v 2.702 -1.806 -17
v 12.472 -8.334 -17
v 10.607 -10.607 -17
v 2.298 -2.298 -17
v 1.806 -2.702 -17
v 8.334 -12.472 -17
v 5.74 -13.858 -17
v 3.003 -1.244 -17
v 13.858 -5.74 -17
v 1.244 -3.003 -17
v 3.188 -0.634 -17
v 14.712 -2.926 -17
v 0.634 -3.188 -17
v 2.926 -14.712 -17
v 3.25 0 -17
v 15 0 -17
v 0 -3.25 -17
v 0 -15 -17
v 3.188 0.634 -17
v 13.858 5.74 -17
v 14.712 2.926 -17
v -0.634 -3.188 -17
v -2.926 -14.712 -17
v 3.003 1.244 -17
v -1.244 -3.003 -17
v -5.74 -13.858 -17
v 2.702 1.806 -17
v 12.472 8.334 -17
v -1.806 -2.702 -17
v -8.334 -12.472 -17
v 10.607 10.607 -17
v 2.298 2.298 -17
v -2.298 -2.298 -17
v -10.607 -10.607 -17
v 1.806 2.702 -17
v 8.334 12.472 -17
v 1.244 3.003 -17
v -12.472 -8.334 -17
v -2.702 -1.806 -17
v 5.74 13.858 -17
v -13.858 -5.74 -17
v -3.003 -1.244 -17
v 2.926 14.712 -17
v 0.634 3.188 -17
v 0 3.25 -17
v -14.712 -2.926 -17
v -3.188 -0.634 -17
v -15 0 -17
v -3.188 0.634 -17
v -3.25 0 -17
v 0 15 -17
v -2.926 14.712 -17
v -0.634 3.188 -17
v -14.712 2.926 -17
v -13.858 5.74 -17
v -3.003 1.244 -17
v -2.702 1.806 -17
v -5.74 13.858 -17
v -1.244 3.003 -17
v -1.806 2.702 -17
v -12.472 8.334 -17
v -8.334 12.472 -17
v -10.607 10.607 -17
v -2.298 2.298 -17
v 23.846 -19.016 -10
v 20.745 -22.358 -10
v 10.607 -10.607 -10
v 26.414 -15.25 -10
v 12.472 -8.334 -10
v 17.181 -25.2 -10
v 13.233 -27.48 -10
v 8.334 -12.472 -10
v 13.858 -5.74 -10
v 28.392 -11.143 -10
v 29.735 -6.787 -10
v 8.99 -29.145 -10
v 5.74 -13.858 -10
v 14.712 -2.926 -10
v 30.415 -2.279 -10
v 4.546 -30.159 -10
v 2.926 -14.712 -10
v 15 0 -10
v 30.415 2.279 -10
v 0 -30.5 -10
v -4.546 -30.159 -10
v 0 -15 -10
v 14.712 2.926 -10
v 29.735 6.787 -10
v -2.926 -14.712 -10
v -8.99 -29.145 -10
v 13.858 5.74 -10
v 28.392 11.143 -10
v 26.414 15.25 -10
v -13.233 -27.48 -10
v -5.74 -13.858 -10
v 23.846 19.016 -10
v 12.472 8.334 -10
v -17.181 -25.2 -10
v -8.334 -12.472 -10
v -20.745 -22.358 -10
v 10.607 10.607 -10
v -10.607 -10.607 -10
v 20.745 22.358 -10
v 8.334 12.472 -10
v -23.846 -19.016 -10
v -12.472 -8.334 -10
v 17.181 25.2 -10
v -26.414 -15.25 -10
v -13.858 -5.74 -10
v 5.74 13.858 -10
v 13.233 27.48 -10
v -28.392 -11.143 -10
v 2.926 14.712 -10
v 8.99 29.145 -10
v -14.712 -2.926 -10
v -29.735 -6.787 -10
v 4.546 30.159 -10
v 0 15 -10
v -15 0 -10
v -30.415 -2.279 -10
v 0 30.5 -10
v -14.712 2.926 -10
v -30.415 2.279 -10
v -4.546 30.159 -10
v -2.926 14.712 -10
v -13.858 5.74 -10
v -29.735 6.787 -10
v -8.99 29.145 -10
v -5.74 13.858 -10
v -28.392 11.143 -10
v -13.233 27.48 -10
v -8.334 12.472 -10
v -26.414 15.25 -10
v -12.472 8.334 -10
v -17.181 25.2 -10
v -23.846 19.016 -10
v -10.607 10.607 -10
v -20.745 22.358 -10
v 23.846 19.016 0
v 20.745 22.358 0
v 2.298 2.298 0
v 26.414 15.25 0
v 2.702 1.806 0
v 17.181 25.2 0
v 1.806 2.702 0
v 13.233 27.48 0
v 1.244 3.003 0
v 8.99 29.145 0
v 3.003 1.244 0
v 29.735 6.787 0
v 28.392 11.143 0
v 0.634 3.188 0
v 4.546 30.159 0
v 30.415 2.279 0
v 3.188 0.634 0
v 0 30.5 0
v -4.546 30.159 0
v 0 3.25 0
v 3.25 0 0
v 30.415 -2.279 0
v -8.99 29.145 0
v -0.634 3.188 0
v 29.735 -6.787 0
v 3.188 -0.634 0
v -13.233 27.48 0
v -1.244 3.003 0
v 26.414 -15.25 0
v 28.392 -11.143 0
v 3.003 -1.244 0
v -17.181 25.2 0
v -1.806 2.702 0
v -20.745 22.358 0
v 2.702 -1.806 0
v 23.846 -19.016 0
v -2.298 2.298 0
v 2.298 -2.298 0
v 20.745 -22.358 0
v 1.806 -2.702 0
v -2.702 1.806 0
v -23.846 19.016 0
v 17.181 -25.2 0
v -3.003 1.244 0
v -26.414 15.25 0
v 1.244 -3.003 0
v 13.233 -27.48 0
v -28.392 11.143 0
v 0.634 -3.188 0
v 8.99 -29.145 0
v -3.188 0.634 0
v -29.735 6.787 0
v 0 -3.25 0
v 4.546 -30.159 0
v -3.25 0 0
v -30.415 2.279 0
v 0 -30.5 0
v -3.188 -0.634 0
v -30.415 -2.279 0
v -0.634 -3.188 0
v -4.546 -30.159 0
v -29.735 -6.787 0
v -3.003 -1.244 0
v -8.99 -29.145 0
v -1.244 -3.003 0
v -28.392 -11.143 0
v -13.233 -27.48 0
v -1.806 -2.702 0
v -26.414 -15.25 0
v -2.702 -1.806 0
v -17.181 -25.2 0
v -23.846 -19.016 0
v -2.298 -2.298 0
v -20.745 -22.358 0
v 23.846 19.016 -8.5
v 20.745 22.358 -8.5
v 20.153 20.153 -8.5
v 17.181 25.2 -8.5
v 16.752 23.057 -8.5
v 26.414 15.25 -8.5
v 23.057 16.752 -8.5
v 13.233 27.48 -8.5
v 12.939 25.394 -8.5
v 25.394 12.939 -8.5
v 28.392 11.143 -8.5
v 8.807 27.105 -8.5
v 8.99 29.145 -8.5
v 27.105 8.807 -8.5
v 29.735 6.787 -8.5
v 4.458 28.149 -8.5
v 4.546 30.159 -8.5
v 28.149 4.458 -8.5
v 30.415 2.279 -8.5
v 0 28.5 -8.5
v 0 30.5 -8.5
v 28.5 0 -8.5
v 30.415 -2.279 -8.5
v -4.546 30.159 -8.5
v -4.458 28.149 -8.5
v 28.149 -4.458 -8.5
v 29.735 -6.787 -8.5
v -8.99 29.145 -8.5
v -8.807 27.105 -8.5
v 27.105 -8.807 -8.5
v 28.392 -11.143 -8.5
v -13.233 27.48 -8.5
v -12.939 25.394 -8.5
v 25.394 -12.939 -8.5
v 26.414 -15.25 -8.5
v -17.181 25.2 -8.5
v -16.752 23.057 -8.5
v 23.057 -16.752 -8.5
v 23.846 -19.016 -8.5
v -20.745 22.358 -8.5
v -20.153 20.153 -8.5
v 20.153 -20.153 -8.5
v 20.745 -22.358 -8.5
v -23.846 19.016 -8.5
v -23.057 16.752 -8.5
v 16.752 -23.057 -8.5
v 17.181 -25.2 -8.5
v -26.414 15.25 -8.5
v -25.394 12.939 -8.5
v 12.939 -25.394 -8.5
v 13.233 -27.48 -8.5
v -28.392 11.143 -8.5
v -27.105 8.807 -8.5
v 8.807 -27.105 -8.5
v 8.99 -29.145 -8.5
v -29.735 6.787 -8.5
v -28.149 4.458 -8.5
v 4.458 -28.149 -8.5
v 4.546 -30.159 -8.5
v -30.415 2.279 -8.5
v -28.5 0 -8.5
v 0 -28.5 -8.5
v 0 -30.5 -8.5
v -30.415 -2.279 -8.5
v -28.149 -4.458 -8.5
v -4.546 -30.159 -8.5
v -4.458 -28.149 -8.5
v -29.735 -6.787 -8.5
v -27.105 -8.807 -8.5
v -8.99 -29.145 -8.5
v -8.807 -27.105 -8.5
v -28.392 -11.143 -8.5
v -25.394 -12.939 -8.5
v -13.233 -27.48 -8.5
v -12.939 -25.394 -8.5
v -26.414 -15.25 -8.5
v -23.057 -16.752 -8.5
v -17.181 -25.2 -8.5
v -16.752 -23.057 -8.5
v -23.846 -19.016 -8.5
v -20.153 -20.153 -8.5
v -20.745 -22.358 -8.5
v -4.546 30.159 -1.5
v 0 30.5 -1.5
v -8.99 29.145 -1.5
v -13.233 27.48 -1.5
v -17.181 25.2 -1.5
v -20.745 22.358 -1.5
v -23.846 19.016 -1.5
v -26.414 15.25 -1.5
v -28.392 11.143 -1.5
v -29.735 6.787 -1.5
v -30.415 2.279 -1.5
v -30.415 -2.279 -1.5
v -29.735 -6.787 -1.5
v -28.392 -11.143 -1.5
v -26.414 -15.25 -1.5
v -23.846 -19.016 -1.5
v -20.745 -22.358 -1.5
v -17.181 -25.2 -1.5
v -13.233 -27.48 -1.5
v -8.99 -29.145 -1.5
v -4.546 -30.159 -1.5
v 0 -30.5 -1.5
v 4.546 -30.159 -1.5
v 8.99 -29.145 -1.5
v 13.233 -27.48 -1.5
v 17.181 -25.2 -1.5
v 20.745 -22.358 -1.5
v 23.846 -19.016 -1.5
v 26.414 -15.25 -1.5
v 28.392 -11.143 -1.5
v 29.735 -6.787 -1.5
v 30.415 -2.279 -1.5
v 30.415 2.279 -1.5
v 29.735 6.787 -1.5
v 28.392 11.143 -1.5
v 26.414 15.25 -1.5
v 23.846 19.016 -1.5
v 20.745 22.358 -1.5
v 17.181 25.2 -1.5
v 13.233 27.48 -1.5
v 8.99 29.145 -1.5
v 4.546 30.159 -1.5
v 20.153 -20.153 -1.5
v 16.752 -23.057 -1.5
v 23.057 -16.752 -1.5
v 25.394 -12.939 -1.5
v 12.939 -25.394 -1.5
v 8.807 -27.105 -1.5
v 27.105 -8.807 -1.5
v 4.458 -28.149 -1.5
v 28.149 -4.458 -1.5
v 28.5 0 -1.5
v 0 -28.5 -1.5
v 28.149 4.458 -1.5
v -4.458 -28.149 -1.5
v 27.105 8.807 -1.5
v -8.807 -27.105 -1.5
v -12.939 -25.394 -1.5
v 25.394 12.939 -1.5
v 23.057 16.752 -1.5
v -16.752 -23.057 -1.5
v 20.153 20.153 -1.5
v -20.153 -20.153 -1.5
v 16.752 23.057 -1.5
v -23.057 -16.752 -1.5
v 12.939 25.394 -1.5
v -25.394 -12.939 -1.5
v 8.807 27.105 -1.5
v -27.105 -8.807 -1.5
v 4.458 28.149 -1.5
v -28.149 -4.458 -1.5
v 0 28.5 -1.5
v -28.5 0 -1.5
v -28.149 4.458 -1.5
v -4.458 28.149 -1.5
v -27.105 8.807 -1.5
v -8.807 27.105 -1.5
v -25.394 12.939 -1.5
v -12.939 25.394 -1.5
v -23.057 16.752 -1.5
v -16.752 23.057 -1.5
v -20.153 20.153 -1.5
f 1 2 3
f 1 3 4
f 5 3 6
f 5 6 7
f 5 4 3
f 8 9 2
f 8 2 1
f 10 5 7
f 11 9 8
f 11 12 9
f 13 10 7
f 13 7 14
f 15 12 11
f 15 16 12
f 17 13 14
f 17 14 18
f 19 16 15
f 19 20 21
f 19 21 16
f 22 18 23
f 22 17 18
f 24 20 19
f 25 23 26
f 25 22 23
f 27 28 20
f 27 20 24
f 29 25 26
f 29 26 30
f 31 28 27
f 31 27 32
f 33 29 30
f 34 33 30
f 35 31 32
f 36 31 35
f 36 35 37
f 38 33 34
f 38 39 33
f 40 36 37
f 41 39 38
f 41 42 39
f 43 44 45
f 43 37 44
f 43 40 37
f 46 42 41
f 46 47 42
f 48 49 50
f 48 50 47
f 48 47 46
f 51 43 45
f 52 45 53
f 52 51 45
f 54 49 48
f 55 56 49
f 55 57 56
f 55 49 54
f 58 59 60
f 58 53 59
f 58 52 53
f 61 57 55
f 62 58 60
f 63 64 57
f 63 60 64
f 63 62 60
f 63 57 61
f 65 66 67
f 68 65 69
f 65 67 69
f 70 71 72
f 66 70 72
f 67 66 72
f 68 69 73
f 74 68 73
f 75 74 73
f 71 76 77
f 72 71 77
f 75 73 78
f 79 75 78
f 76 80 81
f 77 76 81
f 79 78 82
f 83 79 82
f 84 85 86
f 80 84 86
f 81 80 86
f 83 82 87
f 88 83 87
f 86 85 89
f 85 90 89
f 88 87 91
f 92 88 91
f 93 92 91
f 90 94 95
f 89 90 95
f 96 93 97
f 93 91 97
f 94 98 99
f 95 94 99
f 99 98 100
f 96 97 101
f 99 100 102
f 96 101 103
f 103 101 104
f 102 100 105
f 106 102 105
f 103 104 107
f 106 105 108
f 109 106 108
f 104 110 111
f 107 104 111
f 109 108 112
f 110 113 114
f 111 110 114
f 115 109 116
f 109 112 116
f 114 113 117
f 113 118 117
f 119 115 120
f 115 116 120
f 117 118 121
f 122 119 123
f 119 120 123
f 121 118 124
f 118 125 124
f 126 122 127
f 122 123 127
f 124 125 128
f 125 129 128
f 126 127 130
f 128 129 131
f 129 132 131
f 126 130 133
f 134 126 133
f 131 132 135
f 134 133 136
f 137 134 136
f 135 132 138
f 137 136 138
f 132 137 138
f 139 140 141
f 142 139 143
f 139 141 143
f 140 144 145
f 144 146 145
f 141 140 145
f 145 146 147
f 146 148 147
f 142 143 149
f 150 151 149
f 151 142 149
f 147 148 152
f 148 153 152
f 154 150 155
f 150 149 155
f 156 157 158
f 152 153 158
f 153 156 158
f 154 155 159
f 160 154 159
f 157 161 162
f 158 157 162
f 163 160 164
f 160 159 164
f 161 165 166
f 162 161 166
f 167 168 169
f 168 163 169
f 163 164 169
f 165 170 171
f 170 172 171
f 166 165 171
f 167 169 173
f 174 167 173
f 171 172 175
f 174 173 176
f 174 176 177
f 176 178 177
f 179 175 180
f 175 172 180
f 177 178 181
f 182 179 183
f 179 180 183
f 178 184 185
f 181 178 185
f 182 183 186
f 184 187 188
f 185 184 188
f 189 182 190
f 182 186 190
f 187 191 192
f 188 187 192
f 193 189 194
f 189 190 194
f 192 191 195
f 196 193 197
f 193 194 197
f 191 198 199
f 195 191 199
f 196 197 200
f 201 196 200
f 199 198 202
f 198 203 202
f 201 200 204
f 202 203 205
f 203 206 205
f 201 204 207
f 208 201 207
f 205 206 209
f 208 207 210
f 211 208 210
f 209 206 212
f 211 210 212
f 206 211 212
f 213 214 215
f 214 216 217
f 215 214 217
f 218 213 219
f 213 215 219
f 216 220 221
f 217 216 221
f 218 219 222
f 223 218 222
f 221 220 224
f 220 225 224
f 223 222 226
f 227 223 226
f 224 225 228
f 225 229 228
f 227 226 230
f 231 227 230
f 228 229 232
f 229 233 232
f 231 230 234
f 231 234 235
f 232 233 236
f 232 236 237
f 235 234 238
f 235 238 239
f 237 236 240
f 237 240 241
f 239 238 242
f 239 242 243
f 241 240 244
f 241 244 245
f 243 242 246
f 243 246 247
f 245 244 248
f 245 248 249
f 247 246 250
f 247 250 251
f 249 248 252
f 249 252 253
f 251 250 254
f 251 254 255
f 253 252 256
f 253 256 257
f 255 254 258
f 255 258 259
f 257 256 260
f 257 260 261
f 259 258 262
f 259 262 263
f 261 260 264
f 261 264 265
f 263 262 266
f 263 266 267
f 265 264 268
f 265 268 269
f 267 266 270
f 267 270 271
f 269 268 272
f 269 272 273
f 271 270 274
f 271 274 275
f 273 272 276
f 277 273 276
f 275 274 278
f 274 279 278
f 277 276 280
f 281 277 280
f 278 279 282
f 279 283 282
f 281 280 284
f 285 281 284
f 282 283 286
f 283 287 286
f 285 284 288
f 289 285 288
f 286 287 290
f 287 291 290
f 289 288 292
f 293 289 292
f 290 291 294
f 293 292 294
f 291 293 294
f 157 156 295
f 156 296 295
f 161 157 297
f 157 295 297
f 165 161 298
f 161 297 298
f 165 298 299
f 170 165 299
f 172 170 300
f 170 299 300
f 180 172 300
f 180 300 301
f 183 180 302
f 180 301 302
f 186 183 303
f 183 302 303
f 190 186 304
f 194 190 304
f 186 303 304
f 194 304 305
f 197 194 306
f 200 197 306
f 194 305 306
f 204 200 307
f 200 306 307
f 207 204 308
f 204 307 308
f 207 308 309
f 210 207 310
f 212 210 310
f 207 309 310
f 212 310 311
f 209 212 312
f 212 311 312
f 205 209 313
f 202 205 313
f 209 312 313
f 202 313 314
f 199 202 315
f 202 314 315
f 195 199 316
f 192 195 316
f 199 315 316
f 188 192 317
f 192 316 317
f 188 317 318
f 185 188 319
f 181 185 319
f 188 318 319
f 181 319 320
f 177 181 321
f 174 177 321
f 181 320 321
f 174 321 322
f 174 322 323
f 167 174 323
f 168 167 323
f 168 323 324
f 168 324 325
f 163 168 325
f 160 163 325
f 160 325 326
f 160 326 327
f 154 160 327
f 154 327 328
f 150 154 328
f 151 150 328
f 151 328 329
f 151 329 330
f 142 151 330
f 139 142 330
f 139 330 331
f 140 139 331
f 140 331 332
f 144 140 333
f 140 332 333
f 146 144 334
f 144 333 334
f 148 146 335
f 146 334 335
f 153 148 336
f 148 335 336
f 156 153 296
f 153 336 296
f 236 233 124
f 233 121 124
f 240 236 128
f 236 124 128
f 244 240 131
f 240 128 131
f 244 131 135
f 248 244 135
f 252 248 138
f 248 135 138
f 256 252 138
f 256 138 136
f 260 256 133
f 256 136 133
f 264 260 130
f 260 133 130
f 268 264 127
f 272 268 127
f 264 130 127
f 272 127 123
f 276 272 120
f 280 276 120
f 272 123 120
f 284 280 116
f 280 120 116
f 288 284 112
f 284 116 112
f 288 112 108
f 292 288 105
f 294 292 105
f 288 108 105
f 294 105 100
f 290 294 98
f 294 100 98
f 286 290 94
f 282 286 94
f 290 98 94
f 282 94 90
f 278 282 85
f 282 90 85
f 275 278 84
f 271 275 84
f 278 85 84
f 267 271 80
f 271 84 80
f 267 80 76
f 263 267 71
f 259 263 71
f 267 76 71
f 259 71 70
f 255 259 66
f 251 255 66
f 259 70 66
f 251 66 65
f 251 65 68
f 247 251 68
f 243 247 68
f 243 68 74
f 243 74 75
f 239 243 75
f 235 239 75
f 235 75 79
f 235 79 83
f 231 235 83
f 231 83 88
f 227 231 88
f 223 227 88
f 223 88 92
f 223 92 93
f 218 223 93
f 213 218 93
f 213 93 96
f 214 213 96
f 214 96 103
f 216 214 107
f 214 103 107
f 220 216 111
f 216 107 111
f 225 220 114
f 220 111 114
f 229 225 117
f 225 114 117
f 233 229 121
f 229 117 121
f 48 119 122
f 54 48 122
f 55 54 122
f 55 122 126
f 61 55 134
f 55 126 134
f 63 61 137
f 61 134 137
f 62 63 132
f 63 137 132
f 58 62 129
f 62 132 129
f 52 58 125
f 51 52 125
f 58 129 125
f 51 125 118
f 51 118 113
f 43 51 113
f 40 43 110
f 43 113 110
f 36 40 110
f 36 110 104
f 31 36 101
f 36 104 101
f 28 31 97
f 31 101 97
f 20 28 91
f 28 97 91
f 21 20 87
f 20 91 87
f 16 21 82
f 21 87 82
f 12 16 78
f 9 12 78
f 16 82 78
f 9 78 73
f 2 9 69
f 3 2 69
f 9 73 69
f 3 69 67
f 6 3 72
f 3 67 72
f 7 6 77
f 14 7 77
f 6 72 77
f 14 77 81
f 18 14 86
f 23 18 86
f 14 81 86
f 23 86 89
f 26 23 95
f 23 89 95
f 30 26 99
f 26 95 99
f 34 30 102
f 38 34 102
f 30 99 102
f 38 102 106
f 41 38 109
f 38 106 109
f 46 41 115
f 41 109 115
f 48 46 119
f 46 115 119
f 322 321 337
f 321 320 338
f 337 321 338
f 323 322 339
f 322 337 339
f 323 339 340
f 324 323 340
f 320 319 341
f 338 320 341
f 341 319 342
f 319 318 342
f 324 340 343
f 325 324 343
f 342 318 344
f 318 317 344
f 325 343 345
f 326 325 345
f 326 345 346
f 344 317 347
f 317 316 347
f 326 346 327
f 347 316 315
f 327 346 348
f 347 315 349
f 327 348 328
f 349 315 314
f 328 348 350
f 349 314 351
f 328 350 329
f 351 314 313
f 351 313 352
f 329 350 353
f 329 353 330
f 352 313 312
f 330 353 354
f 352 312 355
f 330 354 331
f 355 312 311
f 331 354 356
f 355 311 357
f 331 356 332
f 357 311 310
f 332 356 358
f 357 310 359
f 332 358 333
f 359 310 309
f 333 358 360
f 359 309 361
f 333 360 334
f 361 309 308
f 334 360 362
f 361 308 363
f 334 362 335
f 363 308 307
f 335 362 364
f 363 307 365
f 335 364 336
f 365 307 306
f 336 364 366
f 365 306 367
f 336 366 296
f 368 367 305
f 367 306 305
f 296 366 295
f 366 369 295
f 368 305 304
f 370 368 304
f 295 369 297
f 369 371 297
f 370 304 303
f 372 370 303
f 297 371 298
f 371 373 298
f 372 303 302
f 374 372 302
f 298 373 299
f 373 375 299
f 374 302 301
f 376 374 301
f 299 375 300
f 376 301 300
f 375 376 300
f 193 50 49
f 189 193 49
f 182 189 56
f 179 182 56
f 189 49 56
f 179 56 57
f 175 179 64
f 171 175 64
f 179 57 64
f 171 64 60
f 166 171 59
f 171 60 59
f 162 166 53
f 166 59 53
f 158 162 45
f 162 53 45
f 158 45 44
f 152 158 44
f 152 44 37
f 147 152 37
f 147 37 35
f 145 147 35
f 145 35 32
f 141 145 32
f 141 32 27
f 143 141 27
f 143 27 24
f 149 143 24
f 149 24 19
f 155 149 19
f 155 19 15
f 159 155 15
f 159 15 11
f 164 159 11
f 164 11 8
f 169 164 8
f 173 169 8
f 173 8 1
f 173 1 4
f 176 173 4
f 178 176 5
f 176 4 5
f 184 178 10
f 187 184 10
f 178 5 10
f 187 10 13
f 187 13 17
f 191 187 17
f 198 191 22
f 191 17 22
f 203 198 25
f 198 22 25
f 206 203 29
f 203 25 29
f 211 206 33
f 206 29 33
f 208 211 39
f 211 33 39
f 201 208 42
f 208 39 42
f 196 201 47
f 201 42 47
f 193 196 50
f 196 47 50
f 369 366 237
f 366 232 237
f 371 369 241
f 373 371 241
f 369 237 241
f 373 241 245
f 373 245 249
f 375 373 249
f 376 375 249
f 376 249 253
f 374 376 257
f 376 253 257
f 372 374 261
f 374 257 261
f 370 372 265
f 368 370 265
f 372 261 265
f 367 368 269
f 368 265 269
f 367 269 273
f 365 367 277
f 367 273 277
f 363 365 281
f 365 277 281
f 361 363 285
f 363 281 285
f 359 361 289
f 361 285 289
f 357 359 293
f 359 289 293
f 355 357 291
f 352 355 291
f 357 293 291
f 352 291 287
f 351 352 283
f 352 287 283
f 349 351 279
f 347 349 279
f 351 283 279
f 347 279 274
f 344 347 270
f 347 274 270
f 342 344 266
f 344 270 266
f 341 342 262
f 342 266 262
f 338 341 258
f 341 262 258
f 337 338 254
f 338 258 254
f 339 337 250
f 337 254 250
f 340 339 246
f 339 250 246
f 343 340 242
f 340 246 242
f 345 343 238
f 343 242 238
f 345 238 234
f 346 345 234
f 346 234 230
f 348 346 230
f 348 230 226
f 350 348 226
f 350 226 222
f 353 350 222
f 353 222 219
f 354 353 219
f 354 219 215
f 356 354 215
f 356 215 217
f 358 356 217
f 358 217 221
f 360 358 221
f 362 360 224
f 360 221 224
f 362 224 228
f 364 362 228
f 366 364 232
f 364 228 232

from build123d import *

# Parameters (mm, degrees)
SKETCH_3_R          = 15
EXTRUDE_1_DEPTH     = 7
SKETCH_4_R          = 3.25
CUT_EXTRUDE_1_DEPTH = 18


with BuildPart() as part:
    # Эскиз2 → Повернуть1 (revolve)
    with BuildSketch(Plane(origin=(0, 0, 0), x_dir=(0, 0, -1), z_dir=(1, 0, 0))):
        Polygon((0, 0), (0, 30.5), (1.5, 30.5), (1.5, 28.5), (8.5, 28.5), (8.5, 30.5), (10, 30.5), (10, 0), align=None)
    revolve(axis=Axis((0, 0, -10), (0, 0, 1)))

    # Эскиз3 → Бобышка-Вытянуть1 (add)
    with BuildSketch(Plane(origin=(0, 0, -10), x_dir=(-1, 0, 0), z_dir=(0, 0, -1))):
        Circle(SKETCH_3_R)
    extrude(amount=EXTRUDE_1_DEPTH)

    # Эскиз4 → Вырез-Вытянуть1 (cut, through all)
    with BuildSketch(Plane(origin=(0, 0, -17), x_dir=(-1, 0, 0), z_dir=(0, 0, -1))):
        Circle(SKETCH_4_R)
    extrude(amount=-CUT_EXTRUDE_1_DEPTH, mode=Mode.SUBTRACT)


solid = part.part
